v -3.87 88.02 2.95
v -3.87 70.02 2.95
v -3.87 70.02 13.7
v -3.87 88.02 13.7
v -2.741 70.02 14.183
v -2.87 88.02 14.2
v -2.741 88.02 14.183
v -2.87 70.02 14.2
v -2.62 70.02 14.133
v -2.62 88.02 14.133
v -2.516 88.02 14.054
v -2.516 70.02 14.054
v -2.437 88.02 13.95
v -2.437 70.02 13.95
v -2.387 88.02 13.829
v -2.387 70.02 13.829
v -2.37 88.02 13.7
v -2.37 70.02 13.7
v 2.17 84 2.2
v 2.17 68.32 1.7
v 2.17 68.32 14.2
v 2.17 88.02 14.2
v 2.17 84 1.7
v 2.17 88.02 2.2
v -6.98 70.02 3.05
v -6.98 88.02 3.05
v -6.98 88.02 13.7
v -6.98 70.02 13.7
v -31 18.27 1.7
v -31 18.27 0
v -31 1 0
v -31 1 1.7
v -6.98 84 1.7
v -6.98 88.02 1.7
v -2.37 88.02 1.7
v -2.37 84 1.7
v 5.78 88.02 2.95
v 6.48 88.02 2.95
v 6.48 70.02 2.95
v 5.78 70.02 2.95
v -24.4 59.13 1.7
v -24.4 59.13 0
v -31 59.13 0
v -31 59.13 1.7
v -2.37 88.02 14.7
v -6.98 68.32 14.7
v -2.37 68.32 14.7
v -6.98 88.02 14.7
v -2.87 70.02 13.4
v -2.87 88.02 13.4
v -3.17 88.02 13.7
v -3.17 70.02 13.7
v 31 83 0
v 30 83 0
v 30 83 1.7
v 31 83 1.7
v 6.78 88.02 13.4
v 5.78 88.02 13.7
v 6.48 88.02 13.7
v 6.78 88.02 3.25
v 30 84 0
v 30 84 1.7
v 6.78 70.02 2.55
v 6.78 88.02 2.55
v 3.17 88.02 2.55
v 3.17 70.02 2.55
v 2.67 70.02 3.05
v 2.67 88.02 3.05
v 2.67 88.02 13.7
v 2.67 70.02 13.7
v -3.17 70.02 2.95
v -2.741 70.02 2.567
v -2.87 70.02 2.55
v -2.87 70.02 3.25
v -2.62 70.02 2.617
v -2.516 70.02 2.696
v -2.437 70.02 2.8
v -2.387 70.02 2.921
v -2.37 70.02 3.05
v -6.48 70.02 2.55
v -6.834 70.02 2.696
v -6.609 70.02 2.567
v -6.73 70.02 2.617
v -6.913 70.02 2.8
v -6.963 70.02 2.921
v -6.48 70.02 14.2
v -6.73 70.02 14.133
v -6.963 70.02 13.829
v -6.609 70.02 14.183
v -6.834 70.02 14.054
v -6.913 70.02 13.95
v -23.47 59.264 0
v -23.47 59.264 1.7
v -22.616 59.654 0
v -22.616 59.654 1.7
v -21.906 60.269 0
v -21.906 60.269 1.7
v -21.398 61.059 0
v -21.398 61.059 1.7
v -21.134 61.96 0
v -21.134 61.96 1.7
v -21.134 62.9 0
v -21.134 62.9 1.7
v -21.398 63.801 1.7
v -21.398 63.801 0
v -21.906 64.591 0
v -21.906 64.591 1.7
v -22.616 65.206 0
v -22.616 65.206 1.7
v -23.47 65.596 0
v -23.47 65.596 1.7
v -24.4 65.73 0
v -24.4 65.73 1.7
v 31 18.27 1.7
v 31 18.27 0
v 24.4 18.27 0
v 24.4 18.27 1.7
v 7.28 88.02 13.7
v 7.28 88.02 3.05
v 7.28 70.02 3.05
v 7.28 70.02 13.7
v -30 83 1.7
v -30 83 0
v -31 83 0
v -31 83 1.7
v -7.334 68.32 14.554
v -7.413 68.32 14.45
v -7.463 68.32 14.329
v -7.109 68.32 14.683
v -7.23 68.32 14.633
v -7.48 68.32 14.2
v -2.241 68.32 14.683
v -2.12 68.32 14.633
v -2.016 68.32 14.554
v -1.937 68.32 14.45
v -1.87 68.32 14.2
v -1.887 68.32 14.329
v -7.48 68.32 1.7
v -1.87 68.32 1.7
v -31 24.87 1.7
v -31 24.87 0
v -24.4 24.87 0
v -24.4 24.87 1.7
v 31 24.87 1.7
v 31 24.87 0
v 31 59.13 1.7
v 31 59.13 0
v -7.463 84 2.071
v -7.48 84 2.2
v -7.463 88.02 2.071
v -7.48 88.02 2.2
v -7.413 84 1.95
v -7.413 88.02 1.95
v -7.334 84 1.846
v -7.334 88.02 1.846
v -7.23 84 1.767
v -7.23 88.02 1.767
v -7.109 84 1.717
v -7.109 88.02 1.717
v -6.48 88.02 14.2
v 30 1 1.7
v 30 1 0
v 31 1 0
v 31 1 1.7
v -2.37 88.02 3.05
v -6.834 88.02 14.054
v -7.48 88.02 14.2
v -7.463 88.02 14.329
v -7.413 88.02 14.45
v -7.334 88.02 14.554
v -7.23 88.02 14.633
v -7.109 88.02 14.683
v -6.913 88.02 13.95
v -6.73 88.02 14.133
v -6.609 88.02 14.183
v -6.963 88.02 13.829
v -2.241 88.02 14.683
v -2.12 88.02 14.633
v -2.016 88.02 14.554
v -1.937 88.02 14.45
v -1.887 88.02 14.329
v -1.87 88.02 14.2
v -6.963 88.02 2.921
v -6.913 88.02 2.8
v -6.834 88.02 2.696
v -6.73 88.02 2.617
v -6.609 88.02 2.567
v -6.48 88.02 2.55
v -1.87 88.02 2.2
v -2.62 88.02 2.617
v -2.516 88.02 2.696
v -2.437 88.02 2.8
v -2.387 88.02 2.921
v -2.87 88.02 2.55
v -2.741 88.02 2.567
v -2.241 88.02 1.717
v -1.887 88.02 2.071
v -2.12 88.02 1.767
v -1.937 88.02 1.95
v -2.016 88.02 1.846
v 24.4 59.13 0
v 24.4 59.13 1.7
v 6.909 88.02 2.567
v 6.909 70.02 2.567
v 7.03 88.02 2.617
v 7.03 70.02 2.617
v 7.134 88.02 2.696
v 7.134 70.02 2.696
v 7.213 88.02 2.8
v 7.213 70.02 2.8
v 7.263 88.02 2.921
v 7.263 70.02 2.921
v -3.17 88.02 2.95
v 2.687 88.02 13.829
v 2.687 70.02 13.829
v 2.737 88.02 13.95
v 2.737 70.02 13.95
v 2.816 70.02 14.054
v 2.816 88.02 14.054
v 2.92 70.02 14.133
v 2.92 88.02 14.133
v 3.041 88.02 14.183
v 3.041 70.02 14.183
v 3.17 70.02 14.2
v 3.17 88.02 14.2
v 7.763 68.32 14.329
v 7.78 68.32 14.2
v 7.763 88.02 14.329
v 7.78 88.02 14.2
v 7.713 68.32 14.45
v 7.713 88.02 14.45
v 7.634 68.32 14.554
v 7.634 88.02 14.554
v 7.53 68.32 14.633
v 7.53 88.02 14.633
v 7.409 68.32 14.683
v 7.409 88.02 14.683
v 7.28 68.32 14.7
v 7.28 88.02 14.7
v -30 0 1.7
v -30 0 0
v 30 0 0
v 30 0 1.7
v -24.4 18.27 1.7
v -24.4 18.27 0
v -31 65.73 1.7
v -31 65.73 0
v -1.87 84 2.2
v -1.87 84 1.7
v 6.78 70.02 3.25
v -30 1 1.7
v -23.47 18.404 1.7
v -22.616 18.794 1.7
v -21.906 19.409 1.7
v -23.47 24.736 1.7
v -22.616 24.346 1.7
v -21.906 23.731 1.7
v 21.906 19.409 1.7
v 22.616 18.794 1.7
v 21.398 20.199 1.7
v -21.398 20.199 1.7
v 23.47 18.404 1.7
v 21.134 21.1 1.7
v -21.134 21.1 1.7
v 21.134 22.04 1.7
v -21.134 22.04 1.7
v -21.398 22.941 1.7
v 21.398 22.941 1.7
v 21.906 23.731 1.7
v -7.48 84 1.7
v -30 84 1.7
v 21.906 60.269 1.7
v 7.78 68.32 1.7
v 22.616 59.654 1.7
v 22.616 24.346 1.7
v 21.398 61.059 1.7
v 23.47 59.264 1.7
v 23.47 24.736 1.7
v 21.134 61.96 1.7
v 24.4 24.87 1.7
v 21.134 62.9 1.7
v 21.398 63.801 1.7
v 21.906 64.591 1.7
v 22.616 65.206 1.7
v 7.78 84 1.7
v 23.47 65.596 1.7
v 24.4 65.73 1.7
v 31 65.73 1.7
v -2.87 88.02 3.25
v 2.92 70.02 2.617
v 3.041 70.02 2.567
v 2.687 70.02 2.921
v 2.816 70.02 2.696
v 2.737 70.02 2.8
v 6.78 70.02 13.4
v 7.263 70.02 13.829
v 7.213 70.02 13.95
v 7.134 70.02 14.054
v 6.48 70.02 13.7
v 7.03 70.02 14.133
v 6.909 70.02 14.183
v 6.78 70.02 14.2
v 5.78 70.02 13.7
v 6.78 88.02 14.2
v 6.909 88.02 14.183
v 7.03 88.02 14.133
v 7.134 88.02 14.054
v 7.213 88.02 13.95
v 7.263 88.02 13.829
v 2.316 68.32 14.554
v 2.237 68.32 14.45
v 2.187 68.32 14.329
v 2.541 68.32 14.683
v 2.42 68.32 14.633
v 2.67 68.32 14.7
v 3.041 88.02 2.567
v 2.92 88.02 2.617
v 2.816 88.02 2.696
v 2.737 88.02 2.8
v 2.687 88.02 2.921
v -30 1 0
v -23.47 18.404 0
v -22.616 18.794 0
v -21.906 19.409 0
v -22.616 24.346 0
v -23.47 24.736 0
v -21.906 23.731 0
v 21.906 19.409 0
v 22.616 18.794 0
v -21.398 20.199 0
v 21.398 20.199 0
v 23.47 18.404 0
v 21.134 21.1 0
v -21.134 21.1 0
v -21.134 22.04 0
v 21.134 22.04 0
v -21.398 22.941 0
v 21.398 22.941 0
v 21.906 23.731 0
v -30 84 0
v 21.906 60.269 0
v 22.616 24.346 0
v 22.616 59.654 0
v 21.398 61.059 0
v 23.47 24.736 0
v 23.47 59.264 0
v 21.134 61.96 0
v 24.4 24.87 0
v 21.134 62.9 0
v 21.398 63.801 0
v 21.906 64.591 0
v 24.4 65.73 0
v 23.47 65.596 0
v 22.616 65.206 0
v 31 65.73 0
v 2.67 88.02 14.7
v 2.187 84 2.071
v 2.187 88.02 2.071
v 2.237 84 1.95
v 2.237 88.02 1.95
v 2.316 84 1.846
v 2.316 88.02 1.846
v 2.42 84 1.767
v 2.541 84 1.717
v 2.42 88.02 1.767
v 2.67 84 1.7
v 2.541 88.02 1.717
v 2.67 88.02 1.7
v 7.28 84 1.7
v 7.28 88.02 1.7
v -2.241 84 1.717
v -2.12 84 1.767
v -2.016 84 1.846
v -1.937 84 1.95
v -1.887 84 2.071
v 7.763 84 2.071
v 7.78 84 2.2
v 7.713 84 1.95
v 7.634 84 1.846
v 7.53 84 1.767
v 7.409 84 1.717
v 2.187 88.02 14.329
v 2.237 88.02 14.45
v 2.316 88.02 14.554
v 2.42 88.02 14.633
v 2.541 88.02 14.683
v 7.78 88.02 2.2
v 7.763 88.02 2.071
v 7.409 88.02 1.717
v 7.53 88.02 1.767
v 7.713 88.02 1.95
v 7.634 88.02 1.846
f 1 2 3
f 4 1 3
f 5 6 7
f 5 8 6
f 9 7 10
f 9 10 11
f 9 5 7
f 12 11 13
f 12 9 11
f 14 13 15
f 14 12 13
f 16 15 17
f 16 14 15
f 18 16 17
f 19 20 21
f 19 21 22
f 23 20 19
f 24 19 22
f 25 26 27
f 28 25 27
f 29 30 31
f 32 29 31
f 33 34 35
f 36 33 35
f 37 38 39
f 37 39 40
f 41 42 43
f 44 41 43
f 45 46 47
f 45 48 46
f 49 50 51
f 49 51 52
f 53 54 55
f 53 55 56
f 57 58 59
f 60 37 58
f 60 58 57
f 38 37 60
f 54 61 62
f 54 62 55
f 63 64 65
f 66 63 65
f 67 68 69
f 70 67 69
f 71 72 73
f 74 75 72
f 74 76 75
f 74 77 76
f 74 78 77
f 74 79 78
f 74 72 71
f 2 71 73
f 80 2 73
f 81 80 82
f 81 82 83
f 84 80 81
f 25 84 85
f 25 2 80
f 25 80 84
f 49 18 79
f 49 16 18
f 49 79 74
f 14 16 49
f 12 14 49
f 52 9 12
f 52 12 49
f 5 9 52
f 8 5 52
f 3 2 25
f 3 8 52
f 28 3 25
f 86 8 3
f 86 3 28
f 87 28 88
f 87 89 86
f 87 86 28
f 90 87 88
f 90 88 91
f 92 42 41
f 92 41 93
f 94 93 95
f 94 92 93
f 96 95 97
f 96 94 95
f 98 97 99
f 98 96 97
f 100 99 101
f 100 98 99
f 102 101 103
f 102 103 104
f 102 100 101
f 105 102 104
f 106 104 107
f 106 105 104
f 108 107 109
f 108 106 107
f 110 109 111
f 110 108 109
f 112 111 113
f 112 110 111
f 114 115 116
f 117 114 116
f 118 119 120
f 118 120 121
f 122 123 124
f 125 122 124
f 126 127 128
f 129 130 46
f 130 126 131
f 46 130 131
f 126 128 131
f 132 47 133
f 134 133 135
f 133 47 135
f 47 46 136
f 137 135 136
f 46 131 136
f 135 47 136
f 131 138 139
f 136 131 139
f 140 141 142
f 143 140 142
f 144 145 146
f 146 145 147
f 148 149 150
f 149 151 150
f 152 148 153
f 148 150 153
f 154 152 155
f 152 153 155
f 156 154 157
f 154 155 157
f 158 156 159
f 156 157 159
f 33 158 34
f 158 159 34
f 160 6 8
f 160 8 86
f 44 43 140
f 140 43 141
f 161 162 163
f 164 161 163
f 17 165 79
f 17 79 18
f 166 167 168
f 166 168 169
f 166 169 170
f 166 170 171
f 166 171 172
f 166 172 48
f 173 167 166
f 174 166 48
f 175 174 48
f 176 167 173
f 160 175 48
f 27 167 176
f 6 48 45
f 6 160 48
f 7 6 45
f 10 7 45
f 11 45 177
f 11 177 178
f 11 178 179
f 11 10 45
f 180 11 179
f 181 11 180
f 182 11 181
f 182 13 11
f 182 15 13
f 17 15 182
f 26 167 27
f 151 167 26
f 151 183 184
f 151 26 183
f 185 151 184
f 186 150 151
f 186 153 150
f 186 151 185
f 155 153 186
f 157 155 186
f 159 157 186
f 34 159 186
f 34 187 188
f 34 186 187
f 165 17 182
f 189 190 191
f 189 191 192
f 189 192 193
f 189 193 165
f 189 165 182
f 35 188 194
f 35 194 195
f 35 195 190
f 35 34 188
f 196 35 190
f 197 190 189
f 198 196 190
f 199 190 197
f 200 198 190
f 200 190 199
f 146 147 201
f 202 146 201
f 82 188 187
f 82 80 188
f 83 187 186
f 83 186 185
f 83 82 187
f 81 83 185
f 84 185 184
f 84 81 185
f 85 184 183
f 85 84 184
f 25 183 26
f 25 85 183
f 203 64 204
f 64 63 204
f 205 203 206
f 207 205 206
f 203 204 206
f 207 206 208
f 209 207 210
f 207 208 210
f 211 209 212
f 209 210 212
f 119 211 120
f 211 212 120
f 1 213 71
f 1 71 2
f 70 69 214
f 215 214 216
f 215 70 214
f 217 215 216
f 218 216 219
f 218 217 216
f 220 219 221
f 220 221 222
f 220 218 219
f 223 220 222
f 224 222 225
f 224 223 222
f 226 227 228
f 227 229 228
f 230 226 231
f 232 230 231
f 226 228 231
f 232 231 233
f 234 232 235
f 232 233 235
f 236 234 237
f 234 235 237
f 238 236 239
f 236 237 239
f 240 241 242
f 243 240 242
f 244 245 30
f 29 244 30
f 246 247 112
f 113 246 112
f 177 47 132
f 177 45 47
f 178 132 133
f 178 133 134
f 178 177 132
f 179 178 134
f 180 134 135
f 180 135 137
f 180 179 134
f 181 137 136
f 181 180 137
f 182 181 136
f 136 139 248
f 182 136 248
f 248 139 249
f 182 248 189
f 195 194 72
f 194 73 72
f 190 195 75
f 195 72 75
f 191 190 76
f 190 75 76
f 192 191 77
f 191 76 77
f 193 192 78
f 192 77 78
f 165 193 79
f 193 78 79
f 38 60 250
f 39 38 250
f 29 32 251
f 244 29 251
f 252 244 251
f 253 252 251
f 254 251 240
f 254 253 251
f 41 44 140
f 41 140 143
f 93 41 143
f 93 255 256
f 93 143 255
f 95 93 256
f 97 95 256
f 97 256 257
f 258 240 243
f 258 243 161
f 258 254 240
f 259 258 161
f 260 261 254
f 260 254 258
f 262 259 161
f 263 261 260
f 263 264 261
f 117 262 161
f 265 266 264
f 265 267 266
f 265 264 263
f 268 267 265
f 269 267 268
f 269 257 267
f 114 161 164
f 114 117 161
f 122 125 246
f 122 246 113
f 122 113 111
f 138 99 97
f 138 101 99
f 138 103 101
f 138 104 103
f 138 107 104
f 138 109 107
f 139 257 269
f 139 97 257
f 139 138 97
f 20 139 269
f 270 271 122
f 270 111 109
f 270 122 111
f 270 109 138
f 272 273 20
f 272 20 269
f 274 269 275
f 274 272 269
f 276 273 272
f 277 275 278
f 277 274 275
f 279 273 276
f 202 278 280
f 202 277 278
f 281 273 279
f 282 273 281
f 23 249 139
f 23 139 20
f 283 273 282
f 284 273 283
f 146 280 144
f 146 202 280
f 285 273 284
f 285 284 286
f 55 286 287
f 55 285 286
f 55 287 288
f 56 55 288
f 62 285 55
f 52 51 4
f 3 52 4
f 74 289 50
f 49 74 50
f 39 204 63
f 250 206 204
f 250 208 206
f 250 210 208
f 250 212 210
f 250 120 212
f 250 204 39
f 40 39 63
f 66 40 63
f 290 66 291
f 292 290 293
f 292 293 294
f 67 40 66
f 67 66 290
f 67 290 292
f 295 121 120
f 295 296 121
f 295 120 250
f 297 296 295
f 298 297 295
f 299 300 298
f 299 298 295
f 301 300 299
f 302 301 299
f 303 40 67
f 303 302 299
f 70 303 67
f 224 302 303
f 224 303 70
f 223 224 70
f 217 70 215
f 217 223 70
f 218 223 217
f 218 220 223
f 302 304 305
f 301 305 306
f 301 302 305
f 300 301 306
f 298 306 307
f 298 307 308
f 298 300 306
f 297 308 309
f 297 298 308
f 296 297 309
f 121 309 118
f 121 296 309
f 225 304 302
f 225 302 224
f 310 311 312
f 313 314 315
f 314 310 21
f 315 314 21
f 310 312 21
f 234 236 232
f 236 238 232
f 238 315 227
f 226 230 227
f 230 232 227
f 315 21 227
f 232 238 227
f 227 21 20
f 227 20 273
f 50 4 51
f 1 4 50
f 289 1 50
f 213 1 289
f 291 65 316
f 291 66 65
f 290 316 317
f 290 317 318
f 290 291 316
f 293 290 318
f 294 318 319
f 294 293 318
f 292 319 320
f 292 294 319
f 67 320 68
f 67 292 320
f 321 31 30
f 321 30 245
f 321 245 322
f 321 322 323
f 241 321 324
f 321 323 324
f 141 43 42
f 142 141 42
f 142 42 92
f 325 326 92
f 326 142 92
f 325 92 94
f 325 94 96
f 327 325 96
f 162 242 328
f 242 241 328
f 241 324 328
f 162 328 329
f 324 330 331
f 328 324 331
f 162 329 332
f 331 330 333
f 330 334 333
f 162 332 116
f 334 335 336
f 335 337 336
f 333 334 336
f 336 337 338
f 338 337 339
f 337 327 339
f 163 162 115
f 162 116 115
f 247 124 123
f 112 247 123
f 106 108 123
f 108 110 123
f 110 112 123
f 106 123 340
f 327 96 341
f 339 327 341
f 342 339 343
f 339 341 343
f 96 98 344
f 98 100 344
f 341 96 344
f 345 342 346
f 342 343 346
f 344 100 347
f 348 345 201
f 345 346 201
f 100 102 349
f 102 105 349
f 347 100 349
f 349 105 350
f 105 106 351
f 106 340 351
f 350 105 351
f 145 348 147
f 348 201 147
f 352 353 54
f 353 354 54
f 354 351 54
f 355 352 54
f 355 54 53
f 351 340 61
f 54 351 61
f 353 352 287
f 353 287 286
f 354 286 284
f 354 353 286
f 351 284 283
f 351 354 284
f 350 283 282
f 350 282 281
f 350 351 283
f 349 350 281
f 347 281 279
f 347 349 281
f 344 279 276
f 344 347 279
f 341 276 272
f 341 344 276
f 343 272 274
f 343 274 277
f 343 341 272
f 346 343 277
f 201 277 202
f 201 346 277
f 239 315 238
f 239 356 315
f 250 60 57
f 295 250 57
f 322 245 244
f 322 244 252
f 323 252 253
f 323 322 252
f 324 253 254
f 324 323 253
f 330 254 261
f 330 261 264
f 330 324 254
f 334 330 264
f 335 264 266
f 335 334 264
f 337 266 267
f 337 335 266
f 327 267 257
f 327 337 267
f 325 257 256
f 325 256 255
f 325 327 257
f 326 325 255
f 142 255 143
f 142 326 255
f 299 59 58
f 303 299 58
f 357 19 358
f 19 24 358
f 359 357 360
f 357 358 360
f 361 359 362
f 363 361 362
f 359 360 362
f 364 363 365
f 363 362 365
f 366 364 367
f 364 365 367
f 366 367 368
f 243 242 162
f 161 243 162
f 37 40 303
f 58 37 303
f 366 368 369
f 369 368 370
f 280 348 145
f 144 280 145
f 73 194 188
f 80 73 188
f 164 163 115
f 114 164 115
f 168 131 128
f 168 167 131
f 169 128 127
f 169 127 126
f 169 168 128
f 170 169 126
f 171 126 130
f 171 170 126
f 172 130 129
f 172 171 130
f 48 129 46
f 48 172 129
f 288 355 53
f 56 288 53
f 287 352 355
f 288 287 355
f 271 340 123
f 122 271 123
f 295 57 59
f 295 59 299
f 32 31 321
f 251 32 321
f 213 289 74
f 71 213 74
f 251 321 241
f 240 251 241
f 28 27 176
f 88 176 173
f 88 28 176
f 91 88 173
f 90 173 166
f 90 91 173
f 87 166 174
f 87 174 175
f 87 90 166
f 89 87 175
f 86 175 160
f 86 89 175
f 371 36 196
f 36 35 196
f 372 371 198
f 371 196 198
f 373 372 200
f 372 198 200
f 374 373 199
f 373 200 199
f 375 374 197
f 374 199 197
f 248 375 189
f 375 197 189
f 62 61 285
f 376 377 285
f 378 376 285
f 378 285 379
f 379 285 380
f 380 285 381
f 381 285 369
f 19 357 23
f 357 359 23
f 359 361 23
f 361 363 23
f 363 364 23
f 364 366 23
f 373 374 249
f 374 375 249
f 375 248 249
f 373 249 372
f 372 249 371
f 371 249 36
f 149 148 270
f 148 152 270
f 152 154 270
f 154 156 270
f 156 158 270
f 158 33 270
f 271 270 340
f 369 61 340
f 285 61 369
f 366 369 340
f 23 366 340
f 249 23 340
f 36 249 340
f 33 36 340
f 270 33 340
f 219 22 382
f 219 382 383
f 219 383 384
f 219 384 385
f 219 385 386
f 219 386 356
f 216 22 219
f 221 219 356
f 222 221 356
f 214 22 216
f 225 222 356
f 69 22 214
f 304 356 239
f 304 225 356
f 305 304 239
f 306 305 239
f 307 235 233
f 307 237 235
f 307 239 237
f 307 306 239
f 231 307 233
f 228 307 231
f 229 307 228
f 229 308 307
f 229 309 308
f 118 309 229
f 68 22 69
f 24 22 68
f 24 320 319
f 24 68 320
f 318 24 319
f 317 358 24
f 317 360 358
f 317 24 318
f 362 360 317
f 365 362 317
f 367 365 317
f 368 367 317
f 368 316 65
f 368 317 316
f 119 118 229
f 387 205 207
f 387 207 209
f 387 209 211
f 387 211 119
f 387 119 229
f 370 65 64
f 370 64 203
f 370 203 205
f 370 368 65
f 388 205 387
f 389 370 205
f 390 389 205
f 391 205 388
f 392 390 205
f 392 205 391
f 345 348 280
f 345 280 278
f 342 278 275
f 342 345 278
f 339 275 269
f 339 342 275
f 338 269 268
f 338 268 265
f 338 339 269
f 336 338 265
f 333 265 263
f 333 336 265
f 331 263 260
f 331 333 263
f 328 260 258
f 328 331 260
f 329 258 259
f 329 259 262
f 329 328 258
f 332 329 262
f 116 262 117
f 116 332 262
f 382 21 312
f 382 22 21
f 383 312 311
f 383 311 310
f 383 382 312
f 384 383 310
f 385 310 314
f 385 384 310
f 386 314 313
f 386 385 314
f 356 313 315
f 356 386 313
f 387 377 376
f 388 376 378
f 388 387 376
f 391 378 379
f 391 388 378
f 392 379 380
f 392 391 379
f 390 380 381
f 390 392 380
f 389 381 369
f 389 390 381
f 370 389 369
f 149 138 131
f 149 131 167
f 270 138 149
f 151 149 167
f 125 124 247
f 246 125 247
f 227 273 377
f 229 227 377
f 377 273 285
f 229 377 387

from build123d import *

# Parameters (mm, degrees)
PAD_DEPTH       = 1.7
SKETCH003_W     = 5.61
SKETCH003_H     = 19.7
PAD008_DEPTH    = 13
SKETCH020_W     = 4.61
SKETCH020_H     = 11.65
SKETCH020_W_2   = 1
SKETCH020_H_2   = 10.75
POCKET009_DEPTH = 18
FILLET012_R     = 0.5
FILLET013_R     = 0.5
CHAMFER_SIZE    = 0.3


with BuildPart() as part:
    # Sketch → Pad (new body)
    with BuildSketch(Plane.XY):
        with BuildLine():
            Line((0, 0), (30, 0))
            Line((30, 0), (30, 1))
            Line((30, 1), (31, 1))
            Line((31, 1), (31, 18.27))
            Line((31, 18.27), (24.4, 18.27))
            ThreePointArc((24.4, 24.87), (21.1, 21.57), (24.4, 18.27))
            Line((24.4, 24.87), (31, 24.87))
            Line((31, 24.87), (31, 59.13))
            Line((31, 59.13), (24.4, 59.13))
            ThreePointArc((24.4, 65.73), (21.1, 62.43), (24.4, 59.13))
            Line((24.4, 65.73), (31, 65.73))
            Line((31, 65.73), (31, 83))
            Line((30, 83), (31, 83))
            Line((30, 84), (30, 83))
            Line((30, 84), (0, 84))
            Line((0, 84), (-30, 84))
            Line((-30, 84), (-30, 83))
            Line((-30, 83), (-31, 83))
            Line((-31, 83), (-31, 65.73))
            Line((-31, 65.73), (-24.4, 65.73))
            ThreePointArc((-24.4, 59.13), (-21.1, 62.43), (-24.4, 65.73))
            Line((-24.4, 59.13), (-31, 59.13))
            Line((-31, 59.13), (-31, 24.87))
            Line((-31, 24.87), (-24.4, 24.87))
            ThreePointArc((-24.4, 18.27), (-21.1, 21.57), (-24.4, 24.87))
            Line((-24.4, 18.27), (-31, 18.27))
            Line((-31, 18.27), (-31, 1))
            Line((-31, 1), (-30, 1))
            Line((-30, 1), (-30, 0))
            Line((-30, 0), (0, 0))
        make_face()
    extrude(amount=PAD_DEPTH)

    # Sketch003 → Pad008 (new body)
    with BuildSketch(Plane.XY.offset(1.7)):
        with Locations((-4.675, 78.17)):
            Rectangle(SKETCH003_W, SKETCH003_H)
        with Locations((4.975, 78.17)):
            Rectangle(SKETCH003_W, SKETCH003_H)
    extrude(amount=PAD008_DEPTH)

    # Sketch020 → Pocket009 (cut)
    with BuildSketch(Plane(origin=(0, 88.02, 0), x_dir=(-1, 0, 0), z_dir=(0, 1, 0))):
        with Locations((-4.975, 8.375)):
            Rectangle(SKETCH020_W, SKETCH020_H)
        with Locations((-6.28, 8.325)):
            Rectangle(SKETCH020_W_2, SKETCH020_H_2, mode=Mode.SUBTRACT)
        with Locations((4.675, 8.375)):
            Rectangle(SKETCH020_W, SKETCH020_H)
        with Locations((3.37, 8.325)):
            Rectangle(SKETCH020_W_2, SKETCH020_H_2, mode=Mode.SUBTRACT)
    extrude(amount=-POCKET009_DEPTH, mode=Mode.SUBTRACT)

    # Fillet012
    fillet012_edges = [part.edges().sort_by_distance(p)[0] for p in [
        (7.78, 78.17, 14.7),
        (2.17, 78.17, 14.7),
        (-1.87, 78.17, 14.7),
        (-7.48, 78.17, 14.7),
        (-7.48, 86.01, 1.7),
        (2.17, 86.01, 1.7),
        (7.78, 86.01, 1.7),
        (-1.87, 86.01, 1.7),
    ]]
    fillet(fillet012_edges, radius=FILLET012_R)

    # Fillet013
    fillet013_edges = [part.edges().sort_by_distance(p)[0] for p in [
        (7.28, 79.02, 14.2),
        (-2.37, 79.02, 14.2),
        (2.67, 79.02, 14.2),
        (-6.98, 79.02, 14.2),
        (7.28, 79.02, 2.55),
        (-2.37, 79.02, 2.55),
        (2.67, 79.02, 2.55),
        (-6.98, 79.02, 2.55),
    ]]
    fillet(fillet013_edges, radius=FILLET013_R)

    # Chamfer
    chamfer_edges = [part.edges().sort_by_distance(p)[0] for p in [
        (6.78, 79.02, 13.7),
        (-2.87, 79.02, 13.7),
        (-2.87, 79.02, 2.95),
        (6.78, 79.02, 2.95),
    ]]
    chamfer(chamfer_edges, length=CHAMFER_SIZE)


solid = part.part
